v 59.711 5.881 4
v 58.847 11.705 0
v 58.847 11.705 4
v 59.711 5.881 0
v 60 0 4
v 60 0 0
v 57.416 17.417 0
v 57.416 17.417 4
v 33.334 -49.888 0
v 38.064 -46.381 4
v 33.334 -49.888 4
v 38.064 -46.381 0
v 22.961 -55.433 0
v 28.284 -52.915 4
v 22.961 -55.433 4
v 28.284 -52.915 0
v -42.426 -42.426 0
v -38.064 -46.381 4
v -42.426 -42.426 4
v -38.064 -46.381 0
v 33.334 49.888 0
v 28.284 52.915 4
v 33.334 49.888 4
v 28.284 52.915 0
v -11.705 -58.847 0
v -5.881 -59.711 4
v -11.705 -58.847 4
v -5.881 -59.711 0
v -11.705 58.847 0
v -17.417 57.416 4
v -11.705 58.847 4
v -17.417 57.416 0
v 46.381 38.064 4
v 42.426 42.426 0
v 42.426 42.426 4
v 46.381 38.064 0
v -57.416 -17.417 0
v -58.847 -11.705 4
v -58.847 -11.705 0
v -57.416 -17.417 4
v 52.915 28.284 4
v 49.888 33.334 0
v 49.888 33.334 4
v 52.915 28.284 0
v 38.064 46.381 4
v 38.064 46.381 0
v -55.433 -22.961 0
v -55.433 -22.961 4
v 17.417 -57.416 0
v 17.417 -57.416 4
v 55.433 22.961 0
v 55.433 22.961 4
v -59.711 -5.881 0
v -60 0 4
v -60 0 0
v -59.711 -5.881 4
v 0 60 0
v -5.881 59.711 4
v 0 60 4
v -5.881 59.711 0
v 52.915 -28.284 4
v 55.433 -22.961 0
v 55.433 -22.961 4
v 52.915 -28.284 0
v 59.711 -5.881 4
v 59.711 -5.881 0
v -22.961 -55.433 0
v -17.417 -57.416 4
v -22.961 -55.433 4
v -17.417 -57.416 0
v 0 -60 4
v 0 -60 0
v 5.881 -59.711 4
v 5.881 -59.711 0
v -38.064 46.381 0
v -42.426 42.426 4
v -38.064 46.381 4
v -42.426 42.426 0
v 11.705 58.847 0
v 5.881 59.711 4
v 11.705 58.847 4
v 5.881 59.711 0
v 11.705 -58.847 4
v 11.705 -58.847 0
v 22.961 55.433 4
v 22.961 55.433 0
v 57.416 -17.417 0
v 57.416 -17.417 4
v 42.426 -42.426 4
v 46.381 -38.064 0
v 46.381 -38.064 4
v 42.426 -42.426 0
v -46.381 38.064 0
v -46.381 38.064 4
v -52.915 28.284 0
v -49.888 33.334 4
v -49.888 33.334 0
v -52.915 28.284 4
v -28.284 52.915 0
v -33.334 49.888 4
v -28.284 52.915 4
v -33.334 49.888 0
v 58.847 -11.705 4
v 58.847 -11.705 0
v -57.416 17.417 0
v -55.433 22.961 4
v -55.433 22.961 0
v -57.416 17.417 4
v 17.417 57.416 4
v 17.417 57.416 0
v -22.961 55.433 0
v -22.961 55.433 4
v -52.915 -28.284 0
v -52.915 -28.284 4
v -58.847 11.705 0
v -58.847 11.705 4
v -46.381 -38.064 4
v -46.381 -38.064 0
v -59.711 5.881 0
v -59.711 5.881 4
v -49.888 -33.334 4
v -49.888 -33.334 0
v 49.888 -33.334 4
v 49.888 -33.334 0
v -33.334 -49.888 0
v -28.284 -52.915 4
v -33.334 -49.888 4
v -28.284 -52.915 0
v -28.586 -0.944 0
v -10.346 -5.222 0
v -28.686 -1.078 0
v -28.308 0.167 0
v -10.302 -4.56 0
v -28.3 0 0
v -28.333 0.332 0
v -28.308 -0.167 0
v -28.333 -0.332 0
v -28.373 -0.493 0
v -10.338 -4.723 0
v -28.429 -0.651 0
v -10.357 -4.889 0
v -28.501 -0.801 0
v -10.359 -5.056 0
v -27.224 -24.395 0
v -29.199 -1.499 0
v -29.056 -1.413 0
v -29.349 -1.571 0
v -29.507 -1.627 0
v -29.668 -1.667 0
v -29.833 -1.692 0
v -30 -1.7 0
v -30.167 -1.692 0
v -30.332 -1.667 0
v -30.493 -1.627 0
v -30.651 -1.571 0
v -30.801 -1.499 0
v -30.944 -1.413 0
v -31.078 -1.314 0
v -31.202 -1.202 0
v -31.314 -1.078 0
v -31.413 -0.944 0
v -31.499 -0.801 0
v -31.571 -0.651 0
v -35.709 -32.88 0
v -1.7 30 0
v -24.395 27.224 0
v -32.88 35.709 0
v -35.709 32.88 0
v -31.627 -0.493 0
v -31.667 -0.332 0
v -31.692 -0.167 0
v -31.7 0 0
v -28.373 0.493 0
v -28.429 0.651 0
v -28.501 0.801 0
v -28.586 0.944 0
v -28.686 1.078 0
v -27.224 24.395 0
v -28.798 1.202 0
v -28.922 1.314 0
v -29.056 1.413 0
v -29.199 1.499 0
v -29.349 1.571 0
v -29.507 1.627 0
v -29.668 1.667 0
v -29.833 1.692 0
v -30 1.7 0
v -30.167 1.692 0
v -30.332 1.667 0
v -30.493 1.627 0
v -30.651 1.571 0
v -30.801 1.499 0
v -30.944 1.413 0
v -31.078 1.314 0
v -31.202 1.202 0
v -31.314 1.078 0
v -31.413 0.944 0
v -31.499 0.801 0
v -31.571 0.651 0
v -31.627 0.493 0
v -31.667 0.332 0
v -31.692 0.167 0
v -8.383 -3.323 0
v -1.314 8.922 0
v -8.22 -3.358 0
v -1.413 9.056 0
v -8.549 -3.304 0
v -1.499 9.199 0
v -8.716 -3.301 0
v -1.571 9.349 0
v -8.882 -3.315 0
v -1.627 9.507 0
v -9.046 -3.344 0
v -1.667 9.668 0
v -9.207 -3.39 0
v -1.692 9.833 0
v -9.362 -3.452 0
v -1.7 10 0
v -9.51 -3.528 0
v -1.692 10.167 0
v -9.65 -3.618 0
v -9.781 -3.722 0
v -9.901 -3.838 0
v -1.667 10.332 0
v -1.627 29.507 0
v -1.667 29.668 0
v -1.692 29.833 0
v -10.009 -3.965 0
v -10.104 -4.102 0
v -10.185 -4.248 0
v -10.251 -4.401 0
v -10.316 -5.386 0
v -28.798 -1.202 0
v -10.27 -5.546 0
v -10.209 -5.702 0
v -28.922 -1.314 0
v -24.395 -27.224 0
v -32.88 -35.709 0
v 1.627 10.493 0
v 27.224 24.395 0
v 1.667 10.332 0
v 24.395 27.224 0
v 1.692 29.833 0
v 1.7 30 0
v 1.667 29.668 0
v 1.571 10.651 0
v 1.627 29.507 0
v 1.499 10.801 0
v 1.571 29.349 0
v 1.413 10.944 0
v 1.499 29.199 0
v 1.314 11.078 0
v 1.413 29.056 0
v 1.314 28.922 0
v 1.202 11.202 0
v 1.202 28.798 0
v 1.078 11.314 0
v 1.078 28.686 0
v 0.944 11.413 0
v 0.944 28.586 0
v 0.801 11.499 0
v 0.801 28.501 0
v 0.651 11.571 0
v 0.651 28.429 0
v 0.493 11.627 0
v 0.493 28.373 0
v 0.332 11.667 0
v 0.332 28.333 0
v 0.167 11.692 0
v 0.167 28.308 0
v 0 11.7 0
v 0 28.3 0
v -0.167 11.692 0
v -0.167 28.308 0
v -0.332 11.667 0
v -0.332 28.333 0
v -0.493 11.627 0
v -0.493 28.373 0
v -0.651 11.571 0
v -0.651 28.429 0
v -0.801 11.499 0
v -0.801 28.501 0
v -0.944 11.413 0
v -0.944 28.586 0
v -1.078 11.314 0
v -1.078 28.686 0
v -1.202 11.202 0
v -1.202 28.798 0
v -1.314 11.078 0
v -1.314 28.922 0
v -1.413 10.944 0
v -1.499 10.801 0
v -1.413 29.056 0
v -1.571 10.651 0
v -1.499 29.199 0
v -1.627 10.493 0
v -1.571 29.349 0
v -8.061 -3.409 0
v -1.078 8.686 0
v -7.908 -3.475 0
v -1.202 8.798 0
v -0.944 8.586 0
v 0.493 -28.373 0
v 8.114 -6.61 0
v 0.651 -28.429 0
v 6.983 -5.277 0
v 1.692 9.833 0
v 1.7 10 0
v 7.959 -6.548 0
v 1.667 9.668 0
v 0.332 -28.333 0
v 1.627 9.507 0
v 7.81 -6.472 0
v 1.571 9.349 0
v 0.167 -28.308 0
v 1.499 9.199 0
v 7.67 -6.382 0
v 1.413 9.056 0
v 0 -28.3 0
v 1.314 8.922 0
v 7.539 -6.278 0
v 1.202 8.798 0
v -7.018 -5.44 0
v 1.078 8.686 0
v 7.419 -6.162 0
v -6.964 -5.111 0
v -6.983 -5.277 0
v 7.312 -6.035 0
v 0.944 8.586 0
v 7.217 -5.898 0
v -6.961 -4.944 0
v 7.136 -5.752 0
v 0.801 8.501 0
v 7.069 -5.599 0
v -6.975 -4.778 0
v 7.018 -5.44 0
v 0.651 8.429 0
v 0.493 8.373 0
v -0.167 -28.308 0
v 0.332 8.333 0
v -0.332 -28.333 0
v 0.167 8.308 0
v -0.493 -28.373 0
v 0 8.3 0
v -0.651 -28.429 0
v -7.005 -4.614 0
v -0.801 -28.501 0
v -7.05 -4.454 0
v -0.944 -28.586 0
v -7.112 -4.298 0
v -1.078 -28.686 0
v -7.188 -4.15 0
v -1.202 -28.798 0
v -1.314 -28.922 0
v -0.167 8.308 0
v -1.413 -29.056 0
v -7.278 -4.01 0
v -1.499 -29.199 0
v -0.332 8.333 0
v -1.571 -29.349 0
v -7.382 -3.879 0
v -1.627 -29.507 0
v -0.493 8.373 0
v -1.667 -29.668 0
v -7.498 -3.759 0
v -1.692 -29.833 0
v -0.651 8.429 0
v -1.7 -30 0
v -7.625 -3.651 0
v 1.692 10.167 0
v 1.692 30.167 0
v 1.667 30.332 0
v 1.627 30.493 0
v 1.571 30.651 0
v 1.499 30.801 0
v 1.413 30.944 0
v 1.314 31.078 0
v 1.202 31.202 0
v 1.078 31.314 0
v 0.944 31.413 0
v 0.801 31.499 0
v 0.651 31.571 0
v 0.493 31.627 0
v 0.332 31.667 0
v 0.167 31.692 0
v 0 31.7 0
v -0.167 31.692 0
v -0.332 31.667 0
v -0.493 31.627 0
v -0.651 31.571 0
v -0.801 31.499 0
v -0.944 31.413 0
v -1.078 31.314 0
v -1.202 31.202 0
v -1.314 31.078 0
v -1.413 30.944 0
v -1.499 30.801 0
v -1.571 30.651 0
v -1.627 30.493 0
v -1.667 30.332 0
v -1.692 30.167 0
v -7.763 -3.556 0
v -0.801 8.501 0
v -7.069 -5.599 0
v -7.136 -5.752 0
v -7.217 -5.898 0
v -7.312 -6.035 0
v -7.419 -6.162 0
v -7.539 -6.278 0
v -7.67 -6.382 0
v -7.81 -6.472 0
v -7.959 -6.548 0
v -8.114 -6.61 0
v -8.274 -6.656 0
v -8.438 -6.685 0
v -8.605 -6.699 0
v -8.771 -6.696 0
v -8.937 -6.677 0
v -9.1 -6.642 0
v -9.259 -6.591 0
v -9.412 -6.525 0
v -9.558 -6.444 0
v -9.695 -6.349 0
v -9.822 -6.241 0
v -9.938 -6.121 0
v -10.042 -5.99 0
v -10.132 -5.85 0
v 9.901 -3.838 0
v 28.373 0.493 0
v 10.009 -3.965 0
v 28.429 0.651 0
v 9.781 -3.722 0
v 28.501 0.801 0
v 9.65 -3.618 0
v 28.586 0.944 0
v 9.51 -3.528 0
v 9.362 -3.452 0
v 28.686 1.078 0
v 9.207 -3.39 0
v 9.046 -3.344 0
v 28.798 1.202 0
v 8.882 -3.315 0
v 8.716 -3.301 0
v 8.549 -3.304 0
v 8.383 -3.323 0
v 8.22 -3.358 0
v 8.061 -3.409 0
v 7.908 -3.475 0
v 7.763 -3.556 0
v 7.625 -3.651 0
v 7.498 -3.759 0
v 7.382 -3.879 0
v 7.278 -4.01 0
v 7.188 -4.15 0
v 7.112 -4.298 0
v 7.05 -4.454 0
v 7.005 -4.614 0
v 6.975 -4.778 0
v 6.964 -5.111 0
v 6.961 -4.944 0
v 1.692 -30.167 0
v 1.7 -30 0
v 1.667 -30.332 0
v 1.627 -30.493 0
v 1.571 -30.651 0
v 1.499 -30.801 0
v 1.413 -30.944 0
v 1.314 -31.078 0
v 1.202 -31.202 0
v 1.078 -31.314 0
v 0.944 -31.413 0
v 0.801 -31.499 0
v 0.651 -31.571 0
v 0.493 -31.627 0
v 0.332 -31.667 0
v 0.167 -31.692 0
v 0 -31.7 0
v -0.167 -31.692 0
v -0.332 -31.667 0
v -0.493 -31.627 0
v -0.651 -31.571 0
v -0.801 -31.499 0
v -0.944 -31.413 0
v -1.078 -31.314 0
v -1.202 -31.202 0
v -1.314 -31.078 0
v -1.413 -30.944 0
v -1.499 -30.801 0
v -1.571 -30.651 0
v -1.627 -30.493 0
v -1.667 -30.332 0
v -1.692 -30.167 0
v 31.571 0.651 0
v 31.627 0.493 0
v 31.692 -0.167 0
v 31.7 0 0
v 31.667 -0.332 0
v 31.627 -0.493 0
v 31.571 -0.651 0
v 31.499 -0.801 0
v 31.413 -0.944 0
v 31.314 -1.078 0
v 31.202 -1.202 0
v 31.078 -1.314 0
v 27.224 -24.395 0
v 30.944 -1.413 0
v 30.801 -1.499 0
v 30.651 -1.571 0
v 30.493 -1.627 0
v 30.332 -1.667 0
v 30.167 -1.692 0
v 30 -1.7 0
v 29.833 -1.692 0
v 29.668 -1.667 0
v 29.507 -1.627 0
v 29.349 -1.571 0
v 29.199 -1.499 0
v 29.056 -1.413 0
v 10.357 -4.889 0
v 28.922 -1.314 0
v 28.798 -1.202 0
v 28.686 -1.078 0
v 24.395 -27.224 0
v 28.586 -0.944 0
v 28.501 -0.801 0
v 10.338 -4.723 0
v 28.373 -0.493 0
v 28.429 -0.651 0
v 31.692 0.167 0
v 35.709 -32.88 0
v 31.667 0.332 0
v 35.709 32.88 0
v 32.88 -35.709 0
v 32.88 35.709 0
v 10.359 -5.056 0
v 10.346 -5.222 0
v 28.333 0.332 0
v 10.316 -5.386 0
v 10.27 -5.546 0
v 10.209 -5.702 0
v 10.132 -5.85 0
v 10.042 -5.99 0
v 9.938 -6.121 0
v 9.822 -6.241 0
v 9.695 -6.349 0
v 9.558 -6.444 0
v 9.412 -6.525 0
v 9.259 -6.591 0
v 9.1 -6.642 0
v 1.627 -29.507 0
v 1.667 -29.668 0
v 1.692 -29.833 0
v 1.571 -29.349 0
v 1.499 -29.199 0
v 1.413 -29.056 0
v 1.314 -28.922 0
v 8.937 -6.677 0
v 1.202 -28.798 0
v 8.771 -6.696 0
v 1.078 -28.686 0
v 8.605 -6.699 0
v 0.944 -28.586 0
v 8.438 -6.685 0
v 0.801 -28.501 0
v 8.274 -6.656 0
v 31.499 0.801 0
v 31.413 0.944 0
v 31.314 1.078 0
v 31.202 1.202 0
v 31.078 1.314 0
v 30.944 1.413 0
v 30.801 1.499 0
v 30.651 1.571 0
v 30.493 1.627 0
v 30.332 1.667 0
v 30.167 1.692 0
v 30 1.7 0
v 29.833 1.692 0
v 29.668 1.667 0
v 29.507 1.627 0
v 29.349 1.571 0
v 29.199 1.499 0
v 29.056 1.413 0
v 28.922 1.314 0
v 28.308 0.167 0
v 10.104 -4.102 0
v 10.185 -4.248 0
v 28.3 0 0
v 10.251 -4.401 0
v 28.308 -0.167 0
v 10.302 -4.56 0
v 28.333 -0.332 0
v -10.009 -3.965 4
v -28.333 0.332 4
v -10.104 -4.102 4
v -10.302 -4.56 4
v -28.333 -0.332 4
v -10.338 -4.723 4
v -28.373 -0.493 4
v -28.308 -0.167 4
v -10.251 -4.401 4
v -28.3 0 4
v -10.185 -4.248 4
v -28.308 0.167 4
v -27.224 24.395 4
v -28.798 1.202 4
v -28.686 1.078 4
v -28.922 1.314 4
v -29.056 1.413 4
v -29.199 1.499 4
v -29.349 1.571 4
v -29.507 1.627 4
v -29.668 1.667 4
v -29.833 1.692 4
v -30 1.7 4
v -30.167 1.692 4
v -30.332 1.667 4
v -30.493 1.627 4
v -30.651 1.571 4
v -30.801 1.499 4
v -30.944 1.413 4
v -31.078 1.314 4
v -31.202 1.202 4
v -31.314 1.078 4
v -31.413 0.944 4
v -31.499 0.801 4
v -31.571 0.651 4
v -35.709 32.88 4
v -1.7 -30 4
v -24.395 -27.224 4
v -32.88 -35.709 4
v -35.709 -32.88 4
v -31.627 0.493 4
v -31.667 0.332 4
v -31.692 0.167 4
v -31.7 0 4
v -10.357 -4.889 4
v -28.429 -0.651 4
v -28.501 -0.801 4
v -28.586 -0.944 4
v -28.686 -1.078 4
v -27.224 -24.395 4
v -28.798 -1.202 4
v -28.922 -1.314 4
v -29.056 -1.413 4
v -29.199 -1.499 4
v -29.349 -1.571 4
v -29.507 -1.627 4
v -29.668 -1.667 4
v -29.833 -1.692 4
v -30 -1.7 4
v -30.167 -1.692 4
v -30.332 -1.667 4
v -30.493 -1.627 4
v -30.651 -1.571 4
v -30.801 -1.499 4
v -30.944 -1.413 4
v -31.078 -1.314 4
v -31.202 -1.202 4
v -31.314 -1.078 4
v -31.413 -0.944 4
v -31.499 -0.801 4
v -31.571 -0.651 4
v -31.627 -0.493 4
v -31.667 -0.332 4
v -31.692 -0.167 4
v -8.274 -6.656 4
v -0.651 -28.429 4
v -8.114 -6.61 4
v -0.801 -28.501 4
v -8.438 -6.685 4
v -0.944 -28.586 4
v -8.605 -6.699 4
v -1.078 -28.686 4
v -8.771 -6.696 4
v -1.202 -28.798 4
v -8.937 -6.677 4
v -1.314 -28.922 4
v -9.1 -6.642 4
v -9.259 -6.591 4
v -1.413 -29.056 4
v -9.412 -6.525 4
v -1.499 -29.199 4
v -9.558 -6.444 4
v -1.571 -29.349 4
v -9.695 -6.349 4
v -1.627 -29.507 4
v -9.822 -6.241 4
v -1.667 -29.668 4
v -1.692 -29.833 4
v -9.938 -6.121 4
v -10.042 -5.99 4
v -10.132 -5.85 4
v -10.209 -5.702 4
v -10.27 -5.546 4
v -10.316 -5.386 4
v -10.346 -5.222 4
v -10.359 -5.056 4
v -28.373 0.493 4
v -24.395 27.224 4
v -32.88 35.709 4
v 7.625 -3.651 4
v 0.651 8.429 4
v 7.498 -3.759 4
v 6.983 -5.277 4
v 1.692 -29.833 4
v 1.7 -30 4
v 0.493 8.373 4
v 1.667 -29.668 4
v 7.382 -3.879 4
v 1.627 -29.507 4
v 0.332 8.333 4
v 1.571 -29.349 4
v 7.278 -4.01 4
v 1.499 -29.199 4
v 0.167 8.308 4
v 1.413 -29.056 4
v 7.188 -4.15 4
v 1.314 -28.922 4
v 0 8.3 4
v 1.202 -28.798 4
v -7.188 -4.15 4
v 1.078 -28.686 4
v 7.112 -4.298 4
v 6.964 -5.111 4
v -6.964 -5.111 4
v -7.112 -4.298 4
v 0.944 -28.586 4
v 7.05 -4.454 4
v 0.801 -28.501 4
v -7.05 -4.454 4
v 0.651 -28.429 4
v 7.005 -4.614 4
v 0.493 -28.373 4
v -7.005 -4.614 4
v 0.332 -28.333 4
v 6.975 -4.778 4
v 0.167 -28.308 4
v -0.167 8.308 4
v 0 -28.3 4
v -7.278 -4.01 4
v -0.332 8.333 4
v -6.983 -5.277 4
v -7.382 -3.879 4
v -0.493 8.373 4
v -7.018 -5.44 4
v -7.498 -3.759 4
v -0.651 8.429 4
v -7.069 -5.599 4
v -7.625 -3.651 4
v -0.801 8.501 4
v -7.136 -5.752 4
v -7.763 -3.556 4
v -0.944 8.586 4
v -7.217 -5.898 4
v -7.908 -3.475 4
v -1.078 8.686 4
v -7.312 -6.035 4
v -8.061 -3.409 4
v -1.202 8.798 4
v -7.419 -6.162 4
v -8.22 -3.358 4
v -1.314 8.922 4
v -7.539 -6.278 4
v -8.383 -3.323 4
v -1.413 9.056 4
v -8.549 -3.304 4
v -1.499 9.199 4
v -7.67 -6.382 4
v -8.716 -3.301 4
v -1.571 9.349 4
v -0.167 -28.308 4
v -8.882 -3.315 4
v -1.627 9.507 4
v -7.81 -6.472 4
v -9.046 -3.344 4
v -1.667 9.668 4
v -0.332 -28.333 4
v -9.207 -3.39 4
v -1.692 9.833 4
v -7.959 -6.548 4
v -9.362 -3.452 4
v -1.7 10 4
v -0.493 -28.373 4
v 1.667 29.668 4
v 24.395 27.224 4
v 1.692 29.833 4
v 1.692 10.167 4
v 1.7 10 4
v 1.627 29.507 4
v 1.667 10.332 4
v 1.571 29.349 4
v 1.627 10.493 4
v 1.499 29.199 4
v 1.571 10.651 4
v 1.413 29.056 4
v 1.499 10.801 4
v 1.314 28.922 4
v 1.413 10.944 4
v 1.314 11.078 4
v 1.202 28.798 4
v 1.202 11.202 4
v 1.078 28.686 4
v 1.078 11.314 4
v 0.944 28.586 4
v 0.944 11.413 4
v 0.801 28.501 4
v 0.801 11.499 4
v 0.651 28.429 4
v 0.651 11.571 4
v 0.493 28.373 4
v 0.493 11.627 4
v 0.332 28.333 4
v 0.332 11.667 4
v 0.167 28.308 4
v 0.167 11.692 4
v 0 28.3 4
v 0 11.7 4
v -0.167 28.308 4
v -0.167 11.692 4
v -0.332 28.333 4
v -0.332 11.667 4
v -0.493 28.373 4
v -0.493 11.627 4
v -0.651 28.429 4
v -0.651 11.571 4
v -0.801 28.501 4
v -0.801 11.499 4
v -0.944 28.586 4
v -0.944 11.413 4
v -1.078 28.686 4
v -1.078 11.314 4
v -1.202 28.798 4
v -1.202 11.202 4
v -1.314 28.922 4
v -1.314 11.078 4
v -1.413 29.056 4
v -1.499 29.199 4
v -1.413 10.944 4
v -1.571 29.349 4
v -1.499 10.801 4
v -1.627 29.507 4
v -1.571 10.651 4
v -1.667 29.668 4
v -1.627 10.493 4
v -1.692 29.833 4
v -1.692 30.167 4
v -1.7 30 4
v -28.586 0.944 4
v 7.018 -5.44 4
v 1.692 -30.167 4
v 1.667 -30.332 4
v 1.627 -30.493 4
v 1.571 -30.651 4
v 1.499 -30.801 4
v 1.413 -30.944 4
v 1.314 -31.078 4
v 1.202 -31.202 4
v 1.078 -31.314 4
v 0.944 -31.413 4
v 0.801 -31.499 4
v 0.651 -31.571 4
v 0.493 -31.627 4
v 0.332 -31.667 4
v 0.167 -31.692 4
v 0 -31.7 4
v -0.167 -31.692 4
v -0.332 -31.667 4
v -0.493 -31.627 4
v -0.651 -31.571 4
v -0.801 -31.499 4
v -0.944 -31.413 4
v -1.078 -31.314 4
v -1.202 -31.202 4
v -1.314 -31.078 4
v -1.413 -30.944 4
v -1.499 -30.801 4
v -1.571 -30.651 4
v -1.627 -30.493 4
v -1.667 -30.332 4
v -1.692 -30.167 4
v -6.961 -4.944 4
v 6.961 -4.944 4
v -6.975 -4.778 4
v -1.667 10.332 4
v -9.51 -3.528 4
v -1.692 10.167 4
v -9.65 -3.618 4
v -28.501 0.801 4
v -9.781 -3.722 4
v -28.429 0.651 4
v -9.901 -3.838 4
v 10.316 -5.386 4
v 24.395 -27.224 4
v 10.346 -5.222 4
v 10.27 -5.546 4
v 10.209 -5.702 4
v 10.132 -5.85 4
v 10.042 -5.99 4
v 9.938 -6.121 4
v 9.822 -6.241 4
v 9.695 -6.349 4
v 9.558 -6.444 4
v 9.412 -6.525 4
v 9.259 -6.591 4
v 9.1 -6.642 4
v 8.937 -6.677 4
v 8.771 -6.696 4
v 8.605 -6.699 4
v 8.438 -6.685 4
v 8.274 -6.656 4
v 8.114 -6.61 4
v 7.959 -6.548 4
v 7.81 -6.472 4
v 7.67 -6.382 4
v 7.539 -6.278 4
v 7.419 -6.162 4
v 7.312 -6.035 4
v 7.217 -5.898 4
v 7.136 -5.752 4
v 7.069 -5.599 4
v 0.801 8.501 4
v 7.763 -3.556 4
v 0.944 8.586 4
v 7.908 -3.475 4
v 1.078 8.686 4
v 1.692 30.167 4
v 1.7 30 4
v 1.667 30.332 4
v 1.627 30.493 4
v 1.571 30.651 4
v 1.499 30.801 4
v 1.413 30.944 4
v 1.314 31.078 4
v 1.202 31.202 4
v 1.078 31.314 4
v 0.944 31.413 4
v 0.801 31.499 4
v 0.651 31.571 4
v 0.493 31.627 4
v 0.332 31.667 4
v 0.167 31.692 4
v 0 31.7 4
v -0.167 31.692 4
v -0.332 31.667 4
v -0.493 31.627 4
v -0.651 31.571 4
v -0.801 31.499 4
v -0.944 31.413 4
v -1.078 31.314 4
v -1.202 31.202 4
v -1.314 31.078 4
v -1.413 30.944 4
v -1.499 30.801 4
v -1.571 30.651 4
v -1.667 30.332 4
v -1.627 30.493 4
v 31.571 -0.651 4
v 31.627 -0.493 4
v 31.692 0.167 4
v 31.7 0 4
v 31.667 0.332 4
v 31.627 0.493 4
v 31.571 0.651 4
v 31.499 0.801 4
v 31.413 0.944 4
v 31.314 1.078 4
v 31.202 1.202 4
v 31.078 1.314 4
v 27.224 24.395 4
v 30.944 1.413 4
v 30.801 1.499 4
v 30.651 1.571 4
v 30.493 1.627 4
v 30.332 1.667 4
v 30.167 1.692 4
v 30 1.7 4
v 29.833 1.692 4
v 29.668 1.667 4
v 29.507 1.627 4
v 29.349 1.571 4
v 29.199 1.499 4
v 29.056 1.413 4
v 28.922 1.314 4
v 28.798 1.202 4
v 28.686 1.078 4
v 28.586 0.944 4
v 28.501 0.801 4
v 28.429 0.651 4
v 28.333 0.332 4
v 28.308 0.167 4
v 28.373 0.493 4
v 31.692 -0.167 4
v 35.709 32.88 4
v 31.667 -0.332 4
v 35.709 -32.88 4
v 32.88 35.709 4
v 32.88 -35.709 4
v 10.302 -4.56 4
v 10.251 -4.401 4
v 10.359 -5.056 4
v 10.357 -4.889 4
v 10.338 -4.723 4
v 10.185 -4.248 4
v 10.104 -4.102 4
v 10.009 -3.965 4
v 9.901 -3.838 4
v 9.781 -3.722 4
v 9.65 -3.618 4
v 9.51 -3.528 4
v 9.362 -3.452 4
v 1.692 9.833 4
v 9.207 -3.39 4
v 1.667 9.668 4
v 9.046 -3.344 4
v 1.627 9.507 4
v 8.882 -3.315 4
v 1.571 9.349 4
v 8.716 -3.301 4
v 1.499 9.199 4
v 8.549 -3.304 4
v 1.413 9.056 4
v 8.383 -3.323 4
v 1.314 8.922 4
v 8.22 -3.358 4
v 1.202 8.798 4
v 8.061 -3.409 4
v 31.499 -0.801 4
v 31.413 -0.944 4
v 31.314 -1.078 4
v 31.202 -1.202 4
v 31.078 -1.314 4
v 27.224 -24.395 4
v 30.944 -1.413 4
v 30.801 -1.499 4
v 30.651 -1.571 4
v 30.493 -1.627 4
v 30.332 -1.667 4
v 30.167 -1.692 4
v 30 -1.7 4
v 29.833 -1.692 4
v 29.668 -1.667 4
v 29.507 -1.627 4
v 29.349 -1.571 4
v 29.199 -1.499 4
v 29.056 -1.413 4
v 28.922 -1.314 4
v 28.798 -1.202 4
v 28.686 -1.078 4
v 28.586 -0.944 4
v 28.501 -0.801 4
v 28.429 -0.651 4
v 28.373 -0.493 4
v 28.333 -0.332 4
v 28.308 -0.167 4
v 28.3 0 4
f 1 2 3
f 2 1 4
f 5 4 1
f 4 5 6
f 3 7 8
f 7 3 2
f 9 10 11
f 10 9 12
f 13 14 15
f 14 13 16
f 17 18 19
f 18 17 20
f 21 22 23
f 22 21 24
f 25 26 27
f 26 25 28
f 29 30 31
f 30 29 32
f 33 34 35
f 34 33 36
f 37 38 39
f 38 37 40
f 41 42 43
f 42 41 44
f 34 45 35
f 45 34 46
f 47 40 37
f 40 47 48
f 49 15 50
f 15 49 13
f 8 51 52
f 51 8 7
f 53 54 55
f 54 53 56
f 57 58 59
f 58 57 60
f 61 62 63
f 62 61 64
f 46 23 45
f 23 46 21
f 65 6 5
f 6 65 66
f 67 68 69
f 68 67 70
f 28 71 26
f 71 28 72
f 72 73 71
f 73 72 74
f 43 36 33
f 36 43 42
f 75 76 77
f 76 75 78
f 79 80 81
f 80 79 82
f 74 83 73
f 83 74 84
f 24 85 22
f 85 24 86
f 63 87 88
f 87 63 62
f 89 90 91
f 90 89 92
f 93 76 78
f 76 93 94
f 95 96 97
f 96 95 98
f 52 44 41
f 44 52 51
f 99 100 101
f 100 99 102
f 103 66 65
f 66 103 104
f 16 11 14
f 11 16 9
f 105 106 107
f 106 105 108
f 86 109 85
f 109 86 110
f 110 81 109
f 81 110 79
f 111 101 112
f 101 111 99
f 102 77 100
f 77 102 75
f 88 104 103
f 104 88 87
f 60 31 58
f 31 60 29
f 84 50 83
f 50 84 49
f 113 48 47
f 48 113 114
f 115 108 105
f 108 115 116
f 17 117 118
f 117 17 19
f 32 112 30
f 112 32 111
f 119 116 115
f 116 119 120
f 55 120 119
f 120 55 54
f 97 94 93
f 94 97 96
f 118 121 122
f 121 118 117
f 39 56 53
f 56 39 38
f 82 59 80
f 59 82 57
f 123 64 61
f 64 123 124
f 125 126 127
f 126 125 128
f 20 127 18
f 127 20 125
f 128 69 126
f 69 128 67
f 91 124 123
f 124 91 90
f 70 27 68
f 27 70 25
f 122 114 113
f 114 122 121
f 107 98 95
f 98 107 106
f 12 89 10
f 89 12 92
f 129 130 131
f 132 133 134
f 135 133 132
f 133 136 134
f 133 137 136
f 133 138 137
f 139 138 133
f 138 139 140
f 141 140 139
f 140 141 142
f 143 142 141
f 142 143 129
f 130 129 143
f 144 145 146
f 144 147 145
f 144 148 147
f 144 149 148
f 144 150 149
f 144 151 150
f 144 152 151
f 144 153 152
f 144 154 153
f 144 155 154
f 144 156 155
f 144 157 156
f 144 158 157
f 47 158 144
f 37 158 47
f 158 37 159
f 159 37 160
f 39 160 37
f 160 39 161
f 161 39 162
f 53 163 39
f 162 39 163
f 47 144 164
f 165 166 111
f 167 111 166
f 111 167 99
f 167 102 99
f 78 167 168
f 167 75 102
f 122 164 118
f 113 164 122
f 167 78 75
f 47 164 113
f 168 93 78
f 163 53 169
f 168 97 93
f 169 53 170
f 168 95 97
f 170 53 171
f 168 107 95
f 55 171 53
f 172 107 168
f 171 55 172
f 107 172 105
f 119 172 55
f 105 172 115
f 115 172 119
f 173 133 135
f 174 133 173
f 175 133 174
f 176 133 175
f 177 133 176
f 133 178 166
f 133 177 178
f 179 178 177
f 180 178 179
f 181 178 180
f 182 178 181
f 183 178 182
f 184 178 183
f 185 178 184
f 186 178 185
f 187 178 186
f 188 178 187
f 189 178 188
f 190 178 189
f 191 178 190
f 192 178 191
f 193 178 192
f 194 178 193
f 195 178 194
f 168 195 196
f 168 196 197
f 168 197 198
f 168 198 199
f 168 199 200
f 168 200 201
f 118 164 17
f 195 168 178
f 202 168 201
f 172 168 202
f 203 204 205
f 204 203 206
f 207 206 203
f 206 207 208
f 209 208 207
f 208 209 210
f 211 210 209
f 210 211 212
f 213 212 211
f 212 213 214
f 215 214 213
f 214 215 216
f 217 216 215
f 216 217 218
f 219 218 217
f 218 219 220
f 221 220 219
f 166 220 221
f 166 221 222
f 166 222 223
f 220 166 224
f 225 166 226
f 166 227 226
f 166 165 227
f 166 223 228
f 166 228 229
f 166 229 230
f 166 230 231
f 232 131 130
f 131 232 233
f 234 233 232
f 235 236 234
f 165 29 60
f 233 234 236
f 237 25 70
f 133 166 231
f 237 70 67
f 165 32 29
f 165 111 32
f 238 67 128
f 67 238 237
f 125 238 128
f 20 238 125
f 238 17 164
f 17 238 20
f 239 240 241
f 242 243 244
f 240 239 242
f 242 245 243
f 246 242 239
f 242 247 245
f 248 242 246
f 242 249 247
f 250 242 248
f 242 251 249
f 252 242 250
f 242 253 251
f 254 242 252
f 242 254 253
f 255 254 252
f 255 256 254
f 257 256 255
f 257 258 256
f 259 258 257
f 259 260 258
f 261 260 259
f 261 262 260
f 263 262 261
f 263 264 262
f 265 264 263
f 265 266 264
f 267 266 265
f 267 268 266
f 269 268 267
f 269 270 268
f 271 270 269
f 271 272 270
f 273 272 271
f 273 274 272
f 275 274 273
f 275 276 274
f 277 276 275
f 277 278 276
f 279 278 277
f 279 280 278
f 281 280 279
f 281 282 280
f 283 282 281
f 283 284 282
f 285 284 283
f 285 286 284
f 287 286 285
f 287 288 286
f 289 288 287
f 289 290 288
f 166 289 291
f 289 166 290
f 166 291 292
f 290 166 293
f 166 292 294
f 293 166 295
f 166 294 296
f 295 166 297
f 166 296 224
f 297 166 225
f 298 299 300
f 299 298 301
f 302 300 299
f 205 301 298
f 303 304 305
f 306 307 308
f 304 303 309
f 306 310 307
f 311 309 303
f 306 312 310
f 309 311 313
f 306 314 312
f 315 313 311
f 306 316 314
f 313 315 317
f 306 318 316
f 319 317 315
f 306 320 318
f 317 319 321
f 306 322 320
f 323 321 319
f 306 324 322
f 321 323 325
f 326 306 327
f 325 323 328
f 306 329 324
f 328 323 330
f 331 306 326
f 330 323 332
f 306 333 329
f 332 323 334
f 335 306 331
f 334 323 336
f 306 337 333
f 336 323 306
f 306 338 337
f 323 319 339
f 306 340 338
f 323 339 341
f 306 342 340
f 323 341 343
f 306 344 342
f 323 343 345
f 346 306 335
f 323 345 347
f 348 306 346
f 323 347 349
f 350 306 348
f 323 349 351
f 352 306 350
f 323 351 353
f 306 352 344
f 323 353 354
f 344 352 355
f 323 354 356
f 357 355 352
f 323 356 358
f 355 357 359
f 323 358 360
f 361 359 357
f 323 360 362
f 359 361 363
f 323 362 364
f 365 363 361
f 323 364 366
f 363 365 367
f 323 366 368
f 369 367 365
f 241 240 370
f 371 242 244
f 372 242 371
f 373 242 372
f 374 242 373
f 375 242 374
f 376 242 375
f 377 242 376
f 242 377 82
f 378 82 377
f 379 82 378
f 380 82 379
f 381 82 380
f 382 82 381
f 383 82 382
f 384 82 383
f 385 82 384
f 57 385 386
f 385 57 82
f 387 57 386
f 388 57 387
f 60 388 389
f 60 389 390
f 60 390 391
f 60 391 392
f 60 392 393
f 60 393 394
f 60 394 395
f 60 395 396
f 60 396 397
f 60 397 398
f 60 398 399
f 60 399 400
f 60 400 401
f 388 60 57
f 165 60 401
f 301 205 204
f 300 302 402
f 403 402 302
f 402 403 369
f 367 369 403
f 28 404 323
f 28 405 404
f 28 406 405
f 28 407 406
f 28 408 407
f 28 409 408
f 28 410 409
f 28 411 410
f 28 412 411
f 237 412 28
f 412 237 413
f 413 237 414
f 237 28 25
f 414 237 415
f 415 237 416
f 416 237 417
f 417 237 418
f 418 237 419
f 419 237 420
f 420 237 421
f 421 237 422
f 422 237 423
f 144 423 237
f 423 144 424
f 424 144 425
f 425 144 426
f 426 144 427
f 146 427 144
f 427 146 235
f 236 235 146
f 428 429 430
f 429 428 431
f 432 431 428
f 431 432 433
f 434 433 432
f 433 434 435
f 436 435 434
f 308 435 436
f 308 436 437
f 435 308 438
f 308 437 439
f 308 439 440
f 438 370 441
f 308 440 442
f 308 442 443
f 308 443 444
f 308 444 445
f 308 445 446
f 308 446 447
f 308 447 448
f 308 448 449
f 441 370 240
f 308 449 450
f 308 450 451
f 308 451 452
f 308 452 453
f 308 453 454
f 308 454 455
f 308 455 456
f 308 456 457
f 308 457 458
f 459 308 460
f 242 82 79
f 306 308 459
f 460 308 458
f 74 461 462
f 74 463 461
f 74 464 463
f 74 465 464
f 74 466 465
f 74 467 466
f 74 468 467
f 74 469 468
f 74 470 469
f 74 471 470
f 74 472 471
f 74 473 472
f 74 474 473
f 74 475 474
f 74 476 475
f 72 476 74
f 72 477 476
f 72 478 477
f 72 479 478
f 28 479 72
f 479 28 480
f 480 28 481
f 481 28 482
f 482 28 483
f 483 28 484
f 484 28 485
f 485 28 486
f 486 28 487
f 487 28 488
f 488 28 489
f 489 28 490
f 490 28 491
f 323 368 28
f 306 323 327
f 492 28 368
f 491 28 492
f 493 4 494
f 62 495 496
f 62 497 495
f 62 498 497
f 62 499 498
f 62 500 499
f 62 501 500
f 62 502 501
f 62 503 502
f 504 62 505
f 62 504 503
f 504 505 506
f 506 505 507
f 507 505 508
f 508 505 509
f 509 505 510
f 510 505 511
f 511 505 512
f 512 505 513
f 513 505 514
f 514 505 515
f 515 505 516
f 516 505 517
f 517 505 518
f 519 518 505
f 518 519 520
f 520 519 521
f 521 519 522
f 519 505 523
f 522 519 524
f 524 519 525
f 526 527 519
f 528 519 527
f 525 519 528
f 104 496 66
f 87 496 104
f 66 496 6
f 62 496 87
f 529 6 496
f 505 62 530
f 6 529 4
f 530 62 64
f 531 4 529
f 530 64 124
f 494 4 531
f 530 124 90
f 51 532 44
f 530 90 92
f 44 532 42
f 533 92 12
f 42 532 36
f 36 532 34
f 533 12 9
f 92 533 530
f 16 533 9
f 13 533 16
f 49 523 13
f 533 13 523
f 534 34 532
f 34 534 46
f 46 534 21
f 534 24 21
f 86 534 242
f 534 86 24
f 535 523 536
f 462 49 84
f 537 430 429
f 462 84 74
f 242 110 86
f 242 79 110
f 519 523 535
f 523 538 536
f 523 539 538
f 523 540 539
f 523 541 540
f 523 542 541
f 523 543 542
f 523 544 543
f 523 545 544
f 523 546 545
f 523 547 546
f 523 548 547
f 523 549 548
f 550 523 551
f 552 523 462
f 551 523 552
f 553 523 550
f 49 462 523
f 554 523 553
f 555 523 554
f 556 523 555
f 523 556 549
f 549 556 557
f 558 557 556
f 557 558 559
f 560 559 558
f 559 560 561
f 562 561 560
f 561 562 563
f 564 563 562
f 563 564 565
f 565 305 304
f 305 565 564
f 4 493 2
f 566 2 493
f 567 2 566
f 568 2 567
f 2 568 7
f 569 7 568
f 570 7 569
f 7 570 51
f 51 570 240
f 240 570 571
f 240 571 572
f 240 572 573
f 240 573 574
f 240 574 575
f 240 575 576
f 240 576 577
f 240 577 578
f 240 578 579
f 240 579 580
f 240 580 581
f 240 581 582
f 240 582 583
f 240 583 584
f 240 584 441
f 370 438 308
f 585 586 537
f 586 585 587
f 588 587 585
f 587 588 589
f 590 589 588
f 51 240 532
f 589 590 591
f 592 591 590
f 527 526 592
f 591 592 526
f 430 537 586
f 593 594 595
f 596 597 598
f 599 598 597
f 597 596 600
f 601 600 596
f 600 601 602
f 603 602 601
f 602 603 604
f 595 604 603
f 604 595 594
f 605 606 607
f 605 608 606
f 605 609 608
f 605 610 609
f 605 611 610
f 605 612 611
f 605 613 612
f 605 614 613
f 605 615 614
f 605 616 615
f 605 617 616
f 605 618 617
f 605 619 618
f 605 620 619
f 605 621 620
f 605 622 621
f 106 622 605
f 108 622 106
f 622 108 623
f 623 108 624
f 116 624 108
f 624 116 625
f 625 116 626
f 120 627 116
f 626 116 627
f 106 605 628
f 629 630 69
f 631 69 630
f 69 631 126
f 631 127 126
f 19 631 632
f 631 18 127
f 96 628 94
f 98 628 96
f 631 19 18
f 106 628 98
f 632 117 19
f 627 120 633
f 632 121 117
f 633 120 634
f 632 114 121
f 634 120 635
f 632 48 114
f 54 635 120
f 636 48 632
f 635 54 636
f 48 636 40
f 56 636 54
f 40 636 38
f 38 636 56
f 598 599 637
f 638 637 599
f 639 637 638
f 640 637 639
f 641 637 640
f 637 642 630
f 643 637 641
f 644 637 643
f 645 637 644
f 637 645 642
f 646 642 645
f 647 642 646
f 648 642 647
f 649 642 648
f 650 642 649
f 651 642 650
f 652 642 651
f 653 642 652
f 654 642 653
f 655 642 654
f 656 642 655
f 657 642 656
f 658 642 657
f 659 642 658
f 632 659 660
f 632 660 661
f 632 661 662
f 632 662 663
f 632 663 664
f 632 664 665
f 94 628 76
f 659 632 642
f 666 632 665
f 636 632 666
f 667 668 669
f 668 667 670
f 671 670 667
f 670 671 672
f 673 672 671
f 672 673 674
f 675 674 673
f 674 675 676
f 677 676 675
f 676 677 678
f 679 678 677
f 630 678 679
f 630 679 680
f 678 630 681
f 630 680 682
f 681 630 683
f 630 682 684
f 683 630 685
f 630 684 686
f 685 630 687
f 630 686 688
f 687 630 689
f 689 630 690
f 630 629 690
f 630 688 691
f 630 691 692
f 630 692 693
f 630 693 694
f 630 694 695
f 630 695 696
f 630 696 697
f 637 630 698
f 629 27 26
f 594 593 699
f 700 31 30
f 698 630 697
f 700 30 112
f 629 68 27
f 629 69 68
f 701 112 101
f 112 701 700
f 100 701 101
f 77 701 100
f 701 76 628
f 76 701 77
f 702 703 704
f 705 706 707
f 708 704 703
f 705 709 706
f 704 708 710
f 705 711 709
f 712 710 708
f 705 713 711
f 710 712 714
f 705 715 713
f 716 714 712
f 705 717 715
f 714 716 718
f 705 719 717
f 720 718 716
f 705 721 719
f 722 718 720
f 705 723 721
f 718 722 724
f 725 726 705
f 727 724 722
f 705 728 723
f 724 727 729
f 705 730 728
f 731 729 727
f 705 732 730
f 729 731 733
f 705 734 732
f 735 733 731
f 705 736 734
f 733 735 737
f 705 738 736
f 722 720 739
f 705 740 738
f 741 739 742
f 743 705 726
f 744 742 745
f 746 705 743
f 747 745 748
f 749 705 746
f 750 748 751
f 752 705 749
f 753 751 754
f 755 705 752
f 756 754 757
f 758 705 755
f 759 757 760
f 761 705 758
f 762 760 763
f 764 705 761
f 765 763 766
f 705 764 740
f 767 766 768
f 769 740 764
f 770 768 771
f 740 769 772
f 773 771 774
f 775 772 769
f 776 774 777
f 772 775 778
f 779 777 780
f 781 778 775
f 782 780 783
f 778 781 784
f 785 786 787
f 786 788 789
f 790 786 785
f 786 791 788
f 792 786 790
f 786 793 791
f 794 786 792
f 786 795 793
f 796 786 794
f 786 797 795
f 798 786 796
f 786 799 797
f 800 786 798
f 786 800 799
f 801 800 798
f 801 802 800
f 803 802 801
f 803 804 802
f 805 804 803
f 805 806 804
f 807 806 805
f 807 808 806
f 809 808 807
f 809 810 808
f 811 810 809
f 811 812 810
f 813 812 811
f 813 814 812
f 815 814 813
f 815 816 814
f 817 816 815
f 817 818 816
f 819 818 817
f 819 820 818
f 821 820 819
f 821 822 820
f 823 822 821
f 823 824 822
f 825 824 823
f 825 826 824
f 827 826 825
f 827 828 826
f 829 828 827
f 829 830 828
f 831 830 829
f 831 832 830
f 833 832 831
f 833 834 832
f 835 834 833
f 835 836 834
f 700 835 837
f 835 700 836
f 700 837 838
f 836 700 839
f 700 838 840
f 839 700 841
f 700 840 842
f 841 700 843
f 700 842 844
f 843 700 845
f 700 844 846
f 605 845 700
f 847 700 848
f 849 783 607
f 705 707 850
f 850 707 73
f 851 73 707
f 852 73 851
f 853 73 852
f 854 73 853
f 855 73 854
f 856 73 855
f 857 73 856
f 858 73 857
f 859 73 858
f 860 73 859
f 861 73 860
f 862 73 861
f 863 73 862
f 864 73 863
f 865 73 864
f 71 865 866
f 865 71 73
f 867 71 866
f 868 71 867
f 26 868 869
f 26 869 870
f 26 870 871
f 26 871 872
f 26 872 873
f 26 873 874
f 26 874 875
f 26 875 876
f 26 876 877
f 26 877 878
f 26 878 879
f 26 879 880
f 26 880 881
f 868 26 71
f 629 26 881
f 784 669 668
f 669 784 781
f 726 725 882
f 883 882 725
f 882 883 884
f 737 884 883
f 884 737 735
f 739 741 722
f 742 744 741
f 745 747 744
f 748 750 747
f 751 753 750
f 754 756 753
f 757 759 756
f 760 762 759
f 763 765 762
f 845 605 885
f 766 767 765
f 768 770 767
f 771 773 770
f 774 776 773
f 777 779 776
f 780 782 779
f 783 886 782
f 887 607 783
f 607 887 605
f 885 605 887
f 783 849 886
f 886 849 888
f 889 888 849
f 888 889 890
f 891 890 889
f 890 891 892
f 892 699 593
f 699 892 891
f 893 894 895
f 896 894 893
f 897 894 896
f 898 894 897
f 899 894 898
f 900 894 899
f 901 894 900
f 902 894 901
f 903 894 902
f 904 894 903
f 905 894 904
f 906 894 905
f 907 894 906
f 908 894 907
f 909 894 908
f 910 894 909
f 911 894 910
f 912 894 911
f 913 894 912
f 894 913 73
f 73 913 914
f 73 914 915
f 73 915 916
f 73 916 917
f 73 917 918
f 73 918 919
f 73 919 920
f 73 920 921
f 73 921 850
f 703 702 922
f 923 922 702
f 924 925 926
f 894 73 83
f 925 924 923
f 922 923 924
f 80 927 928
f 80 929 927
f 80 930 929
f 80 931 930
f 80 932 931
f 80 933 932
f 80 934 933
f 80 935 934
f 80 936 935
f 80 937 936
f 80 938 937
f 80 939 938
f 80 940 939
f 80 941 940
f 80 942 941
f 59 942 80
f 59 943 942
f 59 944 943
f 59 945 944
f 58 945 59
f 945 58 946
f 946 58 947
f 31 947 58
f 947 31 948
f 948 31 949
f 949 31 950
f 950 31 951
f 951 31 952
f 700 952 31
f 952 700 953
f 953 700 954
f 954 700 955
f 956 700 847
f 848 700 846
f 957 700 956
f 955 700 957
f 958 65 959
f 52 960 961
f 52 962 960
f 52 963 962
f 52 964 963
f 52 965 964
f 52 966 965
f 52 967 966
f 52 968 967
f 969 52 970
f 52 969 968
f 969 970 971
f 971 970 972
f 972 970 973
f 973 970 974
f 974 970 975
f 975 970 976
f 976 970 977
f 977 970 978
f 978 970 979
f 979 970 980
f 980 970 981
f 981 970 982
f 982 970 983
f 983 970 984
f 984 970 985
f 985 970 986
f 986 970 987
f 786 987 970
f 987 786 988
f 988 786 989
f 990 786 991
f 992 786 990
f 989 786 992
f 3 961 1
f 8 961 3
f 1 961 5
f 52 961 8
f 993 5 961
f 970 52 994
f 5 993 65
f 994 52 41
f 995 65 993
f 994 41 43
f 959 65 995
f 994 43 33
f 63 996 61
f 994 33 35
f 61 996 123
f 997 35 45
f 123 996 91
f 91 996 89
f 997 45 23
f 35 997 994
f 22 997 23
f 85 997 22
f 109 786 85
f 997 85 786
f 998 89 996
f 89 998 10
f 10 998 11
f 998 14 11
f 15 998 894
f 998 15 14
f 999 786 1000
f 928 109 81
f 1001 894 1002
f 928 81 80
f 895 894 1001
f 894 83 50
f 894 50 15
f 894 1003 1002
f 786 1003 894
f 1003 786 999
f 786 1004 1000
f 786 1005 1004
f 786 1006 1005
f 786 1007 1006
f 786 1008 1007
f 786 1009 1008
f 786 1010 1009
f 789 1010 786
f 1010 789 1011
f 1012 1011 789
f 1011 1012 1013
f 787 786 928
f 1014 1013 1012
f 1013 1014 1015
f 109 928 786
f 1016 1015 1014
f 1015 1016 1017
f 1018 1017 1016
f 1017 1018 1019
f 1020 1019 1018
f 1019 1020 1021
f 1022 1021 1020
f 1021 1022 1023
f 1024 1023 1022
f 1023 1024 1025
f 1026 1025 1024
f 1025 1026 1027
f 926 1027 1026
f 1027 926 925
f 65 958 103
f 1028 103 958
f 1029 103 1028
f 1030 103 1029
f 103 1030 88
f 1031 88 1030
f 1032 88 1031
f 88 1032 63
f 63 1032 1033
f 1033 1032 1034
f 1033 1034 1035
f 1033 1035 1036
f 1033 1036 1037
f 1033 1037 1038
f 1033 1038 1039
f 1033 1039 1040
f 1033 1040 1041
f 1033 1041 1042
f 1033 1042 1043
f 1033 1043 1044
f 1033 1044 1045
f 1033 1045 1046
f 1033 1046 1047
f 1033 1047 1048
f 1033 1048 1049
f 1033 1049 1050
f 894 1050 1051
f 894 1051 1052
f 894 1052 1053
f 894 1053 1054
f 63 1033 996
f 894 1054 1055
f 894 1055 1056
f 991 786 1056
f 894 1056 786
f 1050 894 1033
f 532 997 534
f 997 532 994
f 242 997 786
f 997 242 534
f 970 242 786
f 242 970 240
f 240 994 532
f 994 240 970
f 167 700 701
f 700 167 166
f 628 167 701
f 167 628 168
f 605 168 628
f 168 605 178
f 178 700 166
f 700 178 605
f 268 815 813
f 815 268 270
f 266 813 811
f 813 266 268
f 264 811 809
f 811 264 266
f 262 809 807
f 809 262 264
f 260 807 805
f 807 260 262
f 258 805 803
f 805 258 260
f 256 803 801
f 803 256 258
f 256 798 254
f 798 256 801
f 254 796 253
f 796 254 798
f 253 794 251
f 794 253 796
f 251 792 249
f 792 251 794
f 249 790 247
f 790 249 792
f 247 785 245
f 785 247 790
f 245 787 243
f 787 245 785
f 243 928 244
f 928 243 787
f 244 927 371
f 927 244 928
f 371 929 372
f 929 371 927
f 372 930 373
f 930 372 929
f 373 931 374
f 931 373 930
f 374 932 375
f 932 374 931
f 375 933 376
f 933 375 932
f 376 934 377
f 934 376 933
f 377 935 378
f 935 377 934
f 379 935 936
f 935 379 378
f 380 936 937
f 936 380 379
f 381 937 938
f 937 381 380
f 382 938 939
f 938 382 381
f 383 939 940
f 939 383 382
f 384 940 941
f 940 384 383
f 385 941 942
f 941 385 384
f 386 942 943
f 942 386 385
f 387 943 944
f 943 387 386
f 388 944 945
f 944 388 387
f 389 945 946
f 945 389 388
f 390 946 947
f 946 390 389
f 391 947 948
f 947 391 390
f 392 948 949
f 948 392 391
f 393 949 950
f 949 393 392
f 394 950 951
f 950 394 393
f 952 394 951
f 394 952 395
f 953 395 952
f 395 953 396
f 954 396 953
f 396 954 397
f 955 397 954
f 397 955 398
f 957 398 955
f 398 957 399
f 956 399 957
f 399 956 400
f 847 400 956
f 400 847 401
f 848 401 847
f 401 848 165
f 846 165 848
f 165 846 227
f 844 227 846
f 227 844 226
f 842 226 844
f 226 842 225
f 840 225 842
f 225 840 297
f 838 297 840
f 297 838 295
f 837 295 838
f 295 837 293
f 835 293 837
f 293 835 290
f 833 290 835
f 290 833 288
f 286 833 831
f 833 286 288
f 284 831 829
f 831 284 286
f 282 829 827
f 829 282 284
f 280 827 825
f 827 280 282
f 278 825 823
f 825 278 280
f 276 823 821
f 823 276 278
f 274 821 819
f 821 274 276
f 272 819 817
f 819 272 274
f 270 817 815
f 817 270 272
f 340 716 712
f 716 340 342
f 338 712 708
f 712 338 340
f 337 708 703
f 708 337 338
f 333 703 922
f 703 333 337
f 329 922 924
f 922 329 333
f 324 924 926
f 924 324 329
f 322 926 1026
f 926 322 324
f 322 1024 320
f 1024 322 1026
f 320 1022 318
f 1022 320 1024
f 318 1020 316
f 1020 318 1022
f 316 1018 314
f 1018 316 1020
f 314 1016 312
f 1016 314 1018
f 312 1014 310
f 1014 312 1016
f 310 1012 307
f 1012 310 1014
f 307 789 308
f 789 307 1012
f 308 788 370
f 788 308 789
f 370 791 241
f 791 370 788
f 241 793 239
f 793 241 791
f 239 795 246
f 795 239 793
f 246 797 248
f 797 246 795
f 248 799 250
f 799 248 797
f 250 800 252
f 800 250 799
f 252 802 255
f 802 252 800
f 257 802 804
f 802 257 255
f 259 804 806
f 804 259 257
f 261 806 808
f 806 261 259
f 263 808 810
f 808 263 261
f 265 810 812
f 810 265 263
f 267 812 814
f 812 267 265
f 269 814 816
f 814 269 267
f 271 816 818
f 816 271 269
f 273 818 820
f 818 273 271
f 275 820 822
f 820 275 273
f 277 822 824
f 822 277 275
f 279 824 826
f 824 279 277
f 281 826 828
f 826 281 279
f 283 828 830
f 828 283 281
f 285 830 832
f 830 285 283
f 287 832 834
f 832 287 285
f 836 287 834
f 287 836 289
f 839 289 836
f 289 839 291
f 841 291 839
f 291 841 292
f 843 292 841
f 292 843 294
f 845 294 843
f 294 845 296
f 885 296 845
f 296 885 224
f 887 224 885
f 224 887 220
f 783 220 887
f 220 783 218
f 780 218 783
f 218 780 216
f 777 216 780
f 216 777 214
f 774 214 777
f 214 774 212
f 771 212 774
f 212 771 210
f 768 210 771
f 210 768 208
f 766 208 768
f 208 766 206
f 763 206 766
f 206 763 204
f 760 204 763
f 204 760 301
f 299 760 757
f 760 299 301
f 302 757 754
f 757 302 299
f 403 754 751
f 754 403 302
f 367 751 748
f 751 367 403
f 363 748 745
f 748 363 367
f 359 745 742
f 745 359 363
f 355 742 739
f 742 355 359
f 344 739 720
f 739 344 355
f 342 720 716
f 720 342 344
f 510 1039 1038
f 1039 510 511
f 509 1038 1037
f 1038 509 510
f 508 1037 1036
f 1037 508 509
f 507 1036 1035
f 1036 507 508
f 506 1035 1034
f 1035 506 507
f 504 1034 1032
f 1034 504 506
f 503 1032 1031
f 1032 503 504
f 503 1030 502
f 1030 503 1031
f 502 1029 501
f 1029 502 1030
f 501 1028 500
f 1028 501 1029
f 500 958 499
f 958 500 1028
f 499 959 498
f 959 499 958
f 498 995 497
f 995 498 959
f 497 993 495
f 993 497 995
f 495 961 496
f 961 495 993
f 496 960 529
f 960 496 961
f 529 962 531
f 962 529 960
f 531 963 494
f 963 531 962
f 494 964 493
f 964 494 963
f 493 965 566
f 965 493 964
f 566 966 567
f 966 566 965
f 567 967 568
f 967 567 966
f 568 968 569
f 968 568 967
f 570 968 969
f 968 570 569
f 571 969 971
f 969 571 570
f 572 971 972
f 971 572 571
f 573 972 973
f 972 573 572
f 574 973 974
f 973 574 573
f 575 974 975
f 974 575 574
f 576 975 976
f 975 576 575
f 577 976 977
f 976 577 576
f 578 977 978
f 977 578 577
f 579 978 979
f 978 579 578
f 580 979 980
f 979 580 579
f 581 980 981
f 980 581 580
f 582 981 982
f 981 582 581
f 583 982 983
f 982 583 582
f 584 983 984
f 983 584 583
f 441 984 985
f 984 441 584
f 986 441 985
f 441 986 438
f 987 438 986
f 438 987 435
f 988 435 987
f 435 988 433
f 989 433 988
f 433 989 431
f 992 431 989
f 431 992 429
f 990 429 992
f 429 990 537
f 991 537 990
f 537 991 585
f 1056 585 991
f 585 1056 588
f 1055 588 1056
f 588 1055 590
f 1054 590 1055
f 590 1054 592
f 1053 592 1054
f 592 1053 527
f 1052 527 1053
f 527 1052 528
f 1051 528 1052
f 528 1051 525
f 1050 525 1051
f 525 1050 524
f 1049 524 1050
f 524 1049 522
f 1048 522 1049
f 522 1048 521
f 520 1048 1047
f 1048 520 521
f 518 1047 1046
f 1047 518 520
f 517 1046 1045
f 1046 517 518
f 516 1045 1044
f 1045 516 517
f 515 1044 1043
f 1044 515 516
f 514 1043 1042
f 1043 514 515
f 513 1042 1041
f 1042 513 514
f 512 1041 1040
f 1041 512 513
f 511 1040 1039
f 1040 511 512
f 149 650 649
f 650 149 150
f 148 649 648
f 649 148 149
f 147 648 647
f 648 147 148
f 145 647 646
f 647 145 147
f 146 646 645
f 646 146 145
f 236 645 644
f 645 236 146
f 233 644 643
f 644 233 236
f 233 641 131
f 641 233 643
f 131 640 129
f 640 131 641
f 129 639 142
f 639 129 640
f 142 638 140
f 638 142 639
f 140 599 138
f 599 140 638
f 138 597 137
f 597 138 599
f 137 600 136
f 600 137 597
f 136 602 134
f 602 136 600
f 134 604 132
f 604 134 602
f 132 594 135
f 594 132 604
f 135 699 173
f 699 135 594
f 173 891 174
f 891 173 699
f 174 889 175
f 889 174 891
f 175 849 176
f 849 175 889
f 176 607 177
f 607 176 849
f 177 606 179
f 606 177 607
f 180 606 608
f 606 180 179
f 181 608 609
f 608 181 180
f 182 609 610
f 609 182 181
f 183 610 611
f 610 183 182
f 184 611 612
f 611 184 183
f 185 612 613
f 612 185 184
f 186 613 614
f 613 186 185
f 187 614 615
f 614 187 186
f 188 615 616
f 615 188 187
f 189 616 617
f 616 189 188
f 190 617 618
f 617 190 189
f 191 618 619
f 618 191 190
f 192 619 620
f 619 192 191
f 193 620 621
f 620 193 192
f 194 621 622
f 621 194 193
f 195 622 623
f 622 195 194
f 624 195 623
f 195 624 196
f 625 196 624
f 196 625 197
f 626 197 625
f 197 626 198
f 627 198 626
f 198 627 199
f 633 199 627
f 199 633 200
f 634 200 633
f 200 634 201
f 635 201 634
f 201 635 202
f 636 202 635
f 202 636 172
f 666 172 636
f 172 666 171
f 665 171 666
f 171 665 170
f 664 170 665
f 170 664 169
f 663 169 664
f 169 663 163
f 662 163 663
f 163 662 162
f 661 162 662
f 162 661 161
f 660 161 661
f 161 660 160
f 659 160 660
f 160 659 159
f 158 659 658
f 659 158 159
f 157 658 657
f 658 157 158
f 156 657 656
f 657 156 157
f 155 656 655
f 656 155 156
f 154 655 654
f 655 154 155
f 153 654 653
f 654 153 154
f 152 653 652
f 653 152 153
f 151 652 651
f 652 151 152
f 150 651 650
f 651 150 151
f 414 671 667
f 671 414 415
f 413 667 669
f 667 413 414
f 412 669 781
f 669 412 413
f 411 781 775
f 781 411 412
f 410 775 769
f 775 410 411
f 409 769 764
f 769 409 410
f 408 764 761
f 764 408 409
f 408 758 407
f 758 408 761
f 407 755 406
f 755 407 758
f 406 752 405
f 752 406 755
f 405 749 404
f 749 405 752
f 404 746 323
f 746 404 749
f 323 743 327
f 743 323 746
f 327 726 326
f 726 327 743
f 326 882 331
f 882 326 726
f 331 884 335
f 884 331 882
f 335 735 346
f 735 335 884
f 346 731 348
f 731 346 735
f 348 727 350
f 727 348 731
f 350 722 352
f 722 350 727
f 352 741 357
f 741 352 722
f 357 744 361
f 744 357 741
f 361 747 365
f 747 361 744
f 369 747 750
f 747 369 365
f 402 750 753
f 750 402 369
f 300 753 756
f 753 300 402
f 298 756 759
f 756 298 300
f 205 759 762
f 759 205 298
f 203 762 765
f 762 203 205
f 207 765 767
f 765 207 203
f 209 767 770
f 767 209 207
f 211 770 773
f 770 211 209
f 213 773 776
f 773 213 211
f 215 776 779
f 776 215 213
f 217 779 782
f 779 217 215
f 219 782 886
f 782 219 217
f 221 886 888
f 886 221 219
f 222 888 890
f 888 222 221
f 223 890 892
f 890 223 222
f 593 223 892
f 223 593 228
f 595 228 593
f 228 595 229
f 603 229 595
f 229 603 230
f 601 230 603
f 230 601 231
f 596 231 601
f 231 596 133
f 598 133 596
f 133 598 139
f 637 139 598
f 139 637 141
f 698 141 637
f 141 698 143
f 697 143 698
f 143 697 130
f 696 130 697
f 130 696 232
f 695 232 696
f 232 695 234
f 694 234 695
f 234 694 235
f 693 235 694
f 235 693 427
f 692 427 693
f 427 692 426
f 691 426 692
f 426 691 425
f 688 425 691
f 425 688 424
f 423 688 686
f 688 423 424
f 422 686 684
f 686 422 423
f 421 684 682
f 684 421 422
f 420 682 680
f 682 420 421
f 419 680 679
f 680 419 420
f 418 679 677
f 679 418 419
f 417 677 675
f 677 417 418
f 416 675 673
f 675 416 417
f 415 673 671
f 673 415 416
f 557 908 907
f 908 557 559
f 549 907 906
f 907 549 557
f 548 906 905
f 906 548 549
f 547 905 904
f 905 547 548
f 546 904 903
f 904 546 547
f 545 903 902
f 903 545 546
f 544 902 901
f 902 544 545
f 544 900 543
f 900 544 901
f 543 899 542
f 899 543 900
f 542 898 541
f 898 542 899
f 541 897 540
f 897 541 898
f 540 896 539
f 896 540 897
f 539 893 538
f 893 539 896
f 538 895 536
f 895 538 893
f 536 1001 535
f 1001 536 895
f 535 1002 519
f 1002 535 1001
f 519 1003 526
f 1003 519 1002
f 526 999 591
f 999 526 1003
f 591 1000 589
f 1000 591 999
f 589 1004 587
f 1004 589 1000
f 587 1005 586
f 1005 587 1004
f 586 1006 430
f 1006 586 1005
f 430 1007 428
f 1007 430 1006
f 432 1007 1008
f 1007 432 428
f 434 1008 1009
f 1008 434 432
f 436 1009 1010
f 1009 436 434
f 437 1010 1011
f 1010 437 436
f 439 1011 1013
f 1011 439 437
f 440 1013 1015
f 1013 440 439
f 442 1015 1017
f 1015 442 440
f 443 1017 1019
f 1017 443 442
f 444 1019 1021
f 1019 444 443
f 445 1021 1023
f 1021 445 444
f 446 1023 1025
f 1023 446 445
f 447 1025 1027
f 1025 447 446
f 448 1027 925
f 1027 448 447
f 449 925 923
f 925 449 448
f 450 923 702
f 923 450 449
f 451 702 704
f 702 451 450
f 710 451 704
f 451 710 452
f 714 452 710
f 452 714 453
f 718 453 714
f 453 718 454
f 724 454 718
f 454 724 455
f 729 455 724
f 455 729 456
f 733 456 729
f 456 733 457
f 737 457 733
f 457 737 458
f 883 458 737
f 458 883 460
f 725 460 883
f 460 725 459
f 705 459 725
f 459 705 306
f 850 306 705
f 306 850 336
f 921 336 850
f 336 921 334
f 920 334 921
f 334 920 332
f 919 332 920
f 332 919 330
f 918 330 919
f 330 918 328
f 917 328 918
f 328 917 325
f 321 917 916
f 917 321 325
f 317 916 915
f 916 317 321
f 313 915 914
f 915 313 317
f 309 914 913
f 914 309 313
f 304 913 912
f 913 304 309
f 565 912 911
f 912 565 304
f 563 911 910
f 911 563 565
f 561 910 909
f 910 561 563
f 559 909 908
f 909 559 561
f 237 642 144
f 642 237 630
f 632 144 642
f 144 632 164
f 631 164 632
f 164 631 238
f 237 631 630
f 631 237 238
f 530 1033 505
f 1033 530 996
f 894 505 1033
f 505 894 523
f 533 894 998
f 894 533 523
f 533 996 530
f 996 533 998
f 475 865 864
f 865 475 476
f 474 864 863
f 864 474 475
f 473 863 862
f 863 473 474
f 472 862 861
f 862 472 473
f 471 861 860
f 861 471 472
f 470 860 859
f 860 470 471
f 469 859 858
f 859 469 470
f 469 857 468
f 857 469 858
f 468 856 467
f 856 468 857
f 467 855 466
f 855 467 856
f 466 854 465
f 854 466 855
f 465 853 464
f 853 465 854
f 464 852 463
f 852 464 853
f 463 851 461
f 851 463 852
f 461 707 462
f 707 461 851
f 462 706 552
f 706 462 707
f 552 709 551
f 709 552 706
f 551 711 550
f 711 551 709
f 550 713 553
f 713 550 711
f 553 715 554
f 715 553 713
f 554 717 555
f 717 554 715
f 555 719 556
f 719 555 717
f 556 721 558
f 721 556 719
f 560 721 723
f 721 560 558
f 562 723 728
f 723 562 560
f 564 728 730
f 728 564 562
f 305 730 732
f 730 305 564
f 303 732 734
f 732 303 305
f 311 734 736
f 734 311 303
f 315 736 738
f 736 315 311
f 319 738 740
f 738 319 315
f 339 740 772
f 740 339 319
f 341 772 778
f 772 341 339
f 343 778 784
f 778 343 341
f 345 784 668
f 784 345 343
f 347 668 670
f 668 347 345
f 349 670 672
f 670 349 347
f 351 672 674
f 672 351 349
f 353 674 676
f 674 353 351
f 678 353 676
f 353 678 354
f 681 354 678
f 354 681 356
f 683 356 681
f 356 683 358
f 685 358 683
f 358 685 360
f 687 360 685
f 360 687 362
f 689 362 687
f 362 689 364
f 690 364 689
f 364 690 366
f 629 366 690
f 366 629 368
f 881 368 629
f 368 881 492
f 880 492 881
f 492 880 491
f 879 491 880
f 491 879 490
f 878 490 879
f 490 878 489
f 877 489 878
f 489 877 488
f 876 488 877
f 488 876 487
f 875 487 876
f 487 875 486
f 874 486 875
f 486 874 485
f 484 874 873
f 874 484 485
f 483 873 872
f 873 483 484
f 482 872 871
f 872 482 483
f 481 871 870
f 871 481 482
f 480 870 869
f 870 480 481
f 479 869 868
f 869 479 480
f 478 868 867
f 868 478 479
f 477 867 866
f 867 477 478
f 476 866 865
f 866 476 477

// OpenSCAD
// Rotating platter (turntable top) -- see PRINTS.md.
// Print flat, no supports. PETG or PLA, 4+ walls, 30-40% infill (carries
// the mast + LiDAR, print it a bit denser than the base plate).
$fn = 64;

disc_d = 120;
disc_t = 4;

bearing_bolt_circle_d = 85;      // MUST match base_plate.scad -- same bearing, top leaf
bearing_slot_w = 4;
bearing_slot_l = 12;
bearing_slot_angles = [45, 135, 225, 315];

hub_bolt_circle_d = 20;          // motor hub attachment (see motor_hub_*.scad)
hub_hole_d = 3.4;
hub_angles = [90, 210, 330];      // 3-bolt pattern

mast_bolt_circle_d = 60;         // offset both in radius and angle from the
mast_hole_d = 3.4;               // bearing slots so nothing overlaps -- see
mast_angles = [0, 90, 180, 270]; // PRINTS.md clearance note

module bolt_circle_holes(bolt_circle_d, hole_d, angles) {
    for (a = angles)
        rotate([0, 0, a])
            translate([bolt_circle_d / 2, 0])
                circle(d = hole_d);
}

module bearing_slots() {
    for (a = bearing_slot_angles)
        rotate([0, 0, a])
            translate([bearing_bolt_circle_d / 2, 0])
                square([bearing_slot_l, bearing_slot_w], center = true);
}

difference() {
    cylinder(d = disc_d, h = disc_t);

    translate([0, 0, -1]) linear_extrude(disc_t + 2) {
        bearing_slots();
        bolt_circle_holes(hub_bolt_circle_d, hub_hole_d, hub_angles);
        bolt_circle_holes(mast_bolt_circle_d, mast_hole_d, mast_angles);
    }
}
